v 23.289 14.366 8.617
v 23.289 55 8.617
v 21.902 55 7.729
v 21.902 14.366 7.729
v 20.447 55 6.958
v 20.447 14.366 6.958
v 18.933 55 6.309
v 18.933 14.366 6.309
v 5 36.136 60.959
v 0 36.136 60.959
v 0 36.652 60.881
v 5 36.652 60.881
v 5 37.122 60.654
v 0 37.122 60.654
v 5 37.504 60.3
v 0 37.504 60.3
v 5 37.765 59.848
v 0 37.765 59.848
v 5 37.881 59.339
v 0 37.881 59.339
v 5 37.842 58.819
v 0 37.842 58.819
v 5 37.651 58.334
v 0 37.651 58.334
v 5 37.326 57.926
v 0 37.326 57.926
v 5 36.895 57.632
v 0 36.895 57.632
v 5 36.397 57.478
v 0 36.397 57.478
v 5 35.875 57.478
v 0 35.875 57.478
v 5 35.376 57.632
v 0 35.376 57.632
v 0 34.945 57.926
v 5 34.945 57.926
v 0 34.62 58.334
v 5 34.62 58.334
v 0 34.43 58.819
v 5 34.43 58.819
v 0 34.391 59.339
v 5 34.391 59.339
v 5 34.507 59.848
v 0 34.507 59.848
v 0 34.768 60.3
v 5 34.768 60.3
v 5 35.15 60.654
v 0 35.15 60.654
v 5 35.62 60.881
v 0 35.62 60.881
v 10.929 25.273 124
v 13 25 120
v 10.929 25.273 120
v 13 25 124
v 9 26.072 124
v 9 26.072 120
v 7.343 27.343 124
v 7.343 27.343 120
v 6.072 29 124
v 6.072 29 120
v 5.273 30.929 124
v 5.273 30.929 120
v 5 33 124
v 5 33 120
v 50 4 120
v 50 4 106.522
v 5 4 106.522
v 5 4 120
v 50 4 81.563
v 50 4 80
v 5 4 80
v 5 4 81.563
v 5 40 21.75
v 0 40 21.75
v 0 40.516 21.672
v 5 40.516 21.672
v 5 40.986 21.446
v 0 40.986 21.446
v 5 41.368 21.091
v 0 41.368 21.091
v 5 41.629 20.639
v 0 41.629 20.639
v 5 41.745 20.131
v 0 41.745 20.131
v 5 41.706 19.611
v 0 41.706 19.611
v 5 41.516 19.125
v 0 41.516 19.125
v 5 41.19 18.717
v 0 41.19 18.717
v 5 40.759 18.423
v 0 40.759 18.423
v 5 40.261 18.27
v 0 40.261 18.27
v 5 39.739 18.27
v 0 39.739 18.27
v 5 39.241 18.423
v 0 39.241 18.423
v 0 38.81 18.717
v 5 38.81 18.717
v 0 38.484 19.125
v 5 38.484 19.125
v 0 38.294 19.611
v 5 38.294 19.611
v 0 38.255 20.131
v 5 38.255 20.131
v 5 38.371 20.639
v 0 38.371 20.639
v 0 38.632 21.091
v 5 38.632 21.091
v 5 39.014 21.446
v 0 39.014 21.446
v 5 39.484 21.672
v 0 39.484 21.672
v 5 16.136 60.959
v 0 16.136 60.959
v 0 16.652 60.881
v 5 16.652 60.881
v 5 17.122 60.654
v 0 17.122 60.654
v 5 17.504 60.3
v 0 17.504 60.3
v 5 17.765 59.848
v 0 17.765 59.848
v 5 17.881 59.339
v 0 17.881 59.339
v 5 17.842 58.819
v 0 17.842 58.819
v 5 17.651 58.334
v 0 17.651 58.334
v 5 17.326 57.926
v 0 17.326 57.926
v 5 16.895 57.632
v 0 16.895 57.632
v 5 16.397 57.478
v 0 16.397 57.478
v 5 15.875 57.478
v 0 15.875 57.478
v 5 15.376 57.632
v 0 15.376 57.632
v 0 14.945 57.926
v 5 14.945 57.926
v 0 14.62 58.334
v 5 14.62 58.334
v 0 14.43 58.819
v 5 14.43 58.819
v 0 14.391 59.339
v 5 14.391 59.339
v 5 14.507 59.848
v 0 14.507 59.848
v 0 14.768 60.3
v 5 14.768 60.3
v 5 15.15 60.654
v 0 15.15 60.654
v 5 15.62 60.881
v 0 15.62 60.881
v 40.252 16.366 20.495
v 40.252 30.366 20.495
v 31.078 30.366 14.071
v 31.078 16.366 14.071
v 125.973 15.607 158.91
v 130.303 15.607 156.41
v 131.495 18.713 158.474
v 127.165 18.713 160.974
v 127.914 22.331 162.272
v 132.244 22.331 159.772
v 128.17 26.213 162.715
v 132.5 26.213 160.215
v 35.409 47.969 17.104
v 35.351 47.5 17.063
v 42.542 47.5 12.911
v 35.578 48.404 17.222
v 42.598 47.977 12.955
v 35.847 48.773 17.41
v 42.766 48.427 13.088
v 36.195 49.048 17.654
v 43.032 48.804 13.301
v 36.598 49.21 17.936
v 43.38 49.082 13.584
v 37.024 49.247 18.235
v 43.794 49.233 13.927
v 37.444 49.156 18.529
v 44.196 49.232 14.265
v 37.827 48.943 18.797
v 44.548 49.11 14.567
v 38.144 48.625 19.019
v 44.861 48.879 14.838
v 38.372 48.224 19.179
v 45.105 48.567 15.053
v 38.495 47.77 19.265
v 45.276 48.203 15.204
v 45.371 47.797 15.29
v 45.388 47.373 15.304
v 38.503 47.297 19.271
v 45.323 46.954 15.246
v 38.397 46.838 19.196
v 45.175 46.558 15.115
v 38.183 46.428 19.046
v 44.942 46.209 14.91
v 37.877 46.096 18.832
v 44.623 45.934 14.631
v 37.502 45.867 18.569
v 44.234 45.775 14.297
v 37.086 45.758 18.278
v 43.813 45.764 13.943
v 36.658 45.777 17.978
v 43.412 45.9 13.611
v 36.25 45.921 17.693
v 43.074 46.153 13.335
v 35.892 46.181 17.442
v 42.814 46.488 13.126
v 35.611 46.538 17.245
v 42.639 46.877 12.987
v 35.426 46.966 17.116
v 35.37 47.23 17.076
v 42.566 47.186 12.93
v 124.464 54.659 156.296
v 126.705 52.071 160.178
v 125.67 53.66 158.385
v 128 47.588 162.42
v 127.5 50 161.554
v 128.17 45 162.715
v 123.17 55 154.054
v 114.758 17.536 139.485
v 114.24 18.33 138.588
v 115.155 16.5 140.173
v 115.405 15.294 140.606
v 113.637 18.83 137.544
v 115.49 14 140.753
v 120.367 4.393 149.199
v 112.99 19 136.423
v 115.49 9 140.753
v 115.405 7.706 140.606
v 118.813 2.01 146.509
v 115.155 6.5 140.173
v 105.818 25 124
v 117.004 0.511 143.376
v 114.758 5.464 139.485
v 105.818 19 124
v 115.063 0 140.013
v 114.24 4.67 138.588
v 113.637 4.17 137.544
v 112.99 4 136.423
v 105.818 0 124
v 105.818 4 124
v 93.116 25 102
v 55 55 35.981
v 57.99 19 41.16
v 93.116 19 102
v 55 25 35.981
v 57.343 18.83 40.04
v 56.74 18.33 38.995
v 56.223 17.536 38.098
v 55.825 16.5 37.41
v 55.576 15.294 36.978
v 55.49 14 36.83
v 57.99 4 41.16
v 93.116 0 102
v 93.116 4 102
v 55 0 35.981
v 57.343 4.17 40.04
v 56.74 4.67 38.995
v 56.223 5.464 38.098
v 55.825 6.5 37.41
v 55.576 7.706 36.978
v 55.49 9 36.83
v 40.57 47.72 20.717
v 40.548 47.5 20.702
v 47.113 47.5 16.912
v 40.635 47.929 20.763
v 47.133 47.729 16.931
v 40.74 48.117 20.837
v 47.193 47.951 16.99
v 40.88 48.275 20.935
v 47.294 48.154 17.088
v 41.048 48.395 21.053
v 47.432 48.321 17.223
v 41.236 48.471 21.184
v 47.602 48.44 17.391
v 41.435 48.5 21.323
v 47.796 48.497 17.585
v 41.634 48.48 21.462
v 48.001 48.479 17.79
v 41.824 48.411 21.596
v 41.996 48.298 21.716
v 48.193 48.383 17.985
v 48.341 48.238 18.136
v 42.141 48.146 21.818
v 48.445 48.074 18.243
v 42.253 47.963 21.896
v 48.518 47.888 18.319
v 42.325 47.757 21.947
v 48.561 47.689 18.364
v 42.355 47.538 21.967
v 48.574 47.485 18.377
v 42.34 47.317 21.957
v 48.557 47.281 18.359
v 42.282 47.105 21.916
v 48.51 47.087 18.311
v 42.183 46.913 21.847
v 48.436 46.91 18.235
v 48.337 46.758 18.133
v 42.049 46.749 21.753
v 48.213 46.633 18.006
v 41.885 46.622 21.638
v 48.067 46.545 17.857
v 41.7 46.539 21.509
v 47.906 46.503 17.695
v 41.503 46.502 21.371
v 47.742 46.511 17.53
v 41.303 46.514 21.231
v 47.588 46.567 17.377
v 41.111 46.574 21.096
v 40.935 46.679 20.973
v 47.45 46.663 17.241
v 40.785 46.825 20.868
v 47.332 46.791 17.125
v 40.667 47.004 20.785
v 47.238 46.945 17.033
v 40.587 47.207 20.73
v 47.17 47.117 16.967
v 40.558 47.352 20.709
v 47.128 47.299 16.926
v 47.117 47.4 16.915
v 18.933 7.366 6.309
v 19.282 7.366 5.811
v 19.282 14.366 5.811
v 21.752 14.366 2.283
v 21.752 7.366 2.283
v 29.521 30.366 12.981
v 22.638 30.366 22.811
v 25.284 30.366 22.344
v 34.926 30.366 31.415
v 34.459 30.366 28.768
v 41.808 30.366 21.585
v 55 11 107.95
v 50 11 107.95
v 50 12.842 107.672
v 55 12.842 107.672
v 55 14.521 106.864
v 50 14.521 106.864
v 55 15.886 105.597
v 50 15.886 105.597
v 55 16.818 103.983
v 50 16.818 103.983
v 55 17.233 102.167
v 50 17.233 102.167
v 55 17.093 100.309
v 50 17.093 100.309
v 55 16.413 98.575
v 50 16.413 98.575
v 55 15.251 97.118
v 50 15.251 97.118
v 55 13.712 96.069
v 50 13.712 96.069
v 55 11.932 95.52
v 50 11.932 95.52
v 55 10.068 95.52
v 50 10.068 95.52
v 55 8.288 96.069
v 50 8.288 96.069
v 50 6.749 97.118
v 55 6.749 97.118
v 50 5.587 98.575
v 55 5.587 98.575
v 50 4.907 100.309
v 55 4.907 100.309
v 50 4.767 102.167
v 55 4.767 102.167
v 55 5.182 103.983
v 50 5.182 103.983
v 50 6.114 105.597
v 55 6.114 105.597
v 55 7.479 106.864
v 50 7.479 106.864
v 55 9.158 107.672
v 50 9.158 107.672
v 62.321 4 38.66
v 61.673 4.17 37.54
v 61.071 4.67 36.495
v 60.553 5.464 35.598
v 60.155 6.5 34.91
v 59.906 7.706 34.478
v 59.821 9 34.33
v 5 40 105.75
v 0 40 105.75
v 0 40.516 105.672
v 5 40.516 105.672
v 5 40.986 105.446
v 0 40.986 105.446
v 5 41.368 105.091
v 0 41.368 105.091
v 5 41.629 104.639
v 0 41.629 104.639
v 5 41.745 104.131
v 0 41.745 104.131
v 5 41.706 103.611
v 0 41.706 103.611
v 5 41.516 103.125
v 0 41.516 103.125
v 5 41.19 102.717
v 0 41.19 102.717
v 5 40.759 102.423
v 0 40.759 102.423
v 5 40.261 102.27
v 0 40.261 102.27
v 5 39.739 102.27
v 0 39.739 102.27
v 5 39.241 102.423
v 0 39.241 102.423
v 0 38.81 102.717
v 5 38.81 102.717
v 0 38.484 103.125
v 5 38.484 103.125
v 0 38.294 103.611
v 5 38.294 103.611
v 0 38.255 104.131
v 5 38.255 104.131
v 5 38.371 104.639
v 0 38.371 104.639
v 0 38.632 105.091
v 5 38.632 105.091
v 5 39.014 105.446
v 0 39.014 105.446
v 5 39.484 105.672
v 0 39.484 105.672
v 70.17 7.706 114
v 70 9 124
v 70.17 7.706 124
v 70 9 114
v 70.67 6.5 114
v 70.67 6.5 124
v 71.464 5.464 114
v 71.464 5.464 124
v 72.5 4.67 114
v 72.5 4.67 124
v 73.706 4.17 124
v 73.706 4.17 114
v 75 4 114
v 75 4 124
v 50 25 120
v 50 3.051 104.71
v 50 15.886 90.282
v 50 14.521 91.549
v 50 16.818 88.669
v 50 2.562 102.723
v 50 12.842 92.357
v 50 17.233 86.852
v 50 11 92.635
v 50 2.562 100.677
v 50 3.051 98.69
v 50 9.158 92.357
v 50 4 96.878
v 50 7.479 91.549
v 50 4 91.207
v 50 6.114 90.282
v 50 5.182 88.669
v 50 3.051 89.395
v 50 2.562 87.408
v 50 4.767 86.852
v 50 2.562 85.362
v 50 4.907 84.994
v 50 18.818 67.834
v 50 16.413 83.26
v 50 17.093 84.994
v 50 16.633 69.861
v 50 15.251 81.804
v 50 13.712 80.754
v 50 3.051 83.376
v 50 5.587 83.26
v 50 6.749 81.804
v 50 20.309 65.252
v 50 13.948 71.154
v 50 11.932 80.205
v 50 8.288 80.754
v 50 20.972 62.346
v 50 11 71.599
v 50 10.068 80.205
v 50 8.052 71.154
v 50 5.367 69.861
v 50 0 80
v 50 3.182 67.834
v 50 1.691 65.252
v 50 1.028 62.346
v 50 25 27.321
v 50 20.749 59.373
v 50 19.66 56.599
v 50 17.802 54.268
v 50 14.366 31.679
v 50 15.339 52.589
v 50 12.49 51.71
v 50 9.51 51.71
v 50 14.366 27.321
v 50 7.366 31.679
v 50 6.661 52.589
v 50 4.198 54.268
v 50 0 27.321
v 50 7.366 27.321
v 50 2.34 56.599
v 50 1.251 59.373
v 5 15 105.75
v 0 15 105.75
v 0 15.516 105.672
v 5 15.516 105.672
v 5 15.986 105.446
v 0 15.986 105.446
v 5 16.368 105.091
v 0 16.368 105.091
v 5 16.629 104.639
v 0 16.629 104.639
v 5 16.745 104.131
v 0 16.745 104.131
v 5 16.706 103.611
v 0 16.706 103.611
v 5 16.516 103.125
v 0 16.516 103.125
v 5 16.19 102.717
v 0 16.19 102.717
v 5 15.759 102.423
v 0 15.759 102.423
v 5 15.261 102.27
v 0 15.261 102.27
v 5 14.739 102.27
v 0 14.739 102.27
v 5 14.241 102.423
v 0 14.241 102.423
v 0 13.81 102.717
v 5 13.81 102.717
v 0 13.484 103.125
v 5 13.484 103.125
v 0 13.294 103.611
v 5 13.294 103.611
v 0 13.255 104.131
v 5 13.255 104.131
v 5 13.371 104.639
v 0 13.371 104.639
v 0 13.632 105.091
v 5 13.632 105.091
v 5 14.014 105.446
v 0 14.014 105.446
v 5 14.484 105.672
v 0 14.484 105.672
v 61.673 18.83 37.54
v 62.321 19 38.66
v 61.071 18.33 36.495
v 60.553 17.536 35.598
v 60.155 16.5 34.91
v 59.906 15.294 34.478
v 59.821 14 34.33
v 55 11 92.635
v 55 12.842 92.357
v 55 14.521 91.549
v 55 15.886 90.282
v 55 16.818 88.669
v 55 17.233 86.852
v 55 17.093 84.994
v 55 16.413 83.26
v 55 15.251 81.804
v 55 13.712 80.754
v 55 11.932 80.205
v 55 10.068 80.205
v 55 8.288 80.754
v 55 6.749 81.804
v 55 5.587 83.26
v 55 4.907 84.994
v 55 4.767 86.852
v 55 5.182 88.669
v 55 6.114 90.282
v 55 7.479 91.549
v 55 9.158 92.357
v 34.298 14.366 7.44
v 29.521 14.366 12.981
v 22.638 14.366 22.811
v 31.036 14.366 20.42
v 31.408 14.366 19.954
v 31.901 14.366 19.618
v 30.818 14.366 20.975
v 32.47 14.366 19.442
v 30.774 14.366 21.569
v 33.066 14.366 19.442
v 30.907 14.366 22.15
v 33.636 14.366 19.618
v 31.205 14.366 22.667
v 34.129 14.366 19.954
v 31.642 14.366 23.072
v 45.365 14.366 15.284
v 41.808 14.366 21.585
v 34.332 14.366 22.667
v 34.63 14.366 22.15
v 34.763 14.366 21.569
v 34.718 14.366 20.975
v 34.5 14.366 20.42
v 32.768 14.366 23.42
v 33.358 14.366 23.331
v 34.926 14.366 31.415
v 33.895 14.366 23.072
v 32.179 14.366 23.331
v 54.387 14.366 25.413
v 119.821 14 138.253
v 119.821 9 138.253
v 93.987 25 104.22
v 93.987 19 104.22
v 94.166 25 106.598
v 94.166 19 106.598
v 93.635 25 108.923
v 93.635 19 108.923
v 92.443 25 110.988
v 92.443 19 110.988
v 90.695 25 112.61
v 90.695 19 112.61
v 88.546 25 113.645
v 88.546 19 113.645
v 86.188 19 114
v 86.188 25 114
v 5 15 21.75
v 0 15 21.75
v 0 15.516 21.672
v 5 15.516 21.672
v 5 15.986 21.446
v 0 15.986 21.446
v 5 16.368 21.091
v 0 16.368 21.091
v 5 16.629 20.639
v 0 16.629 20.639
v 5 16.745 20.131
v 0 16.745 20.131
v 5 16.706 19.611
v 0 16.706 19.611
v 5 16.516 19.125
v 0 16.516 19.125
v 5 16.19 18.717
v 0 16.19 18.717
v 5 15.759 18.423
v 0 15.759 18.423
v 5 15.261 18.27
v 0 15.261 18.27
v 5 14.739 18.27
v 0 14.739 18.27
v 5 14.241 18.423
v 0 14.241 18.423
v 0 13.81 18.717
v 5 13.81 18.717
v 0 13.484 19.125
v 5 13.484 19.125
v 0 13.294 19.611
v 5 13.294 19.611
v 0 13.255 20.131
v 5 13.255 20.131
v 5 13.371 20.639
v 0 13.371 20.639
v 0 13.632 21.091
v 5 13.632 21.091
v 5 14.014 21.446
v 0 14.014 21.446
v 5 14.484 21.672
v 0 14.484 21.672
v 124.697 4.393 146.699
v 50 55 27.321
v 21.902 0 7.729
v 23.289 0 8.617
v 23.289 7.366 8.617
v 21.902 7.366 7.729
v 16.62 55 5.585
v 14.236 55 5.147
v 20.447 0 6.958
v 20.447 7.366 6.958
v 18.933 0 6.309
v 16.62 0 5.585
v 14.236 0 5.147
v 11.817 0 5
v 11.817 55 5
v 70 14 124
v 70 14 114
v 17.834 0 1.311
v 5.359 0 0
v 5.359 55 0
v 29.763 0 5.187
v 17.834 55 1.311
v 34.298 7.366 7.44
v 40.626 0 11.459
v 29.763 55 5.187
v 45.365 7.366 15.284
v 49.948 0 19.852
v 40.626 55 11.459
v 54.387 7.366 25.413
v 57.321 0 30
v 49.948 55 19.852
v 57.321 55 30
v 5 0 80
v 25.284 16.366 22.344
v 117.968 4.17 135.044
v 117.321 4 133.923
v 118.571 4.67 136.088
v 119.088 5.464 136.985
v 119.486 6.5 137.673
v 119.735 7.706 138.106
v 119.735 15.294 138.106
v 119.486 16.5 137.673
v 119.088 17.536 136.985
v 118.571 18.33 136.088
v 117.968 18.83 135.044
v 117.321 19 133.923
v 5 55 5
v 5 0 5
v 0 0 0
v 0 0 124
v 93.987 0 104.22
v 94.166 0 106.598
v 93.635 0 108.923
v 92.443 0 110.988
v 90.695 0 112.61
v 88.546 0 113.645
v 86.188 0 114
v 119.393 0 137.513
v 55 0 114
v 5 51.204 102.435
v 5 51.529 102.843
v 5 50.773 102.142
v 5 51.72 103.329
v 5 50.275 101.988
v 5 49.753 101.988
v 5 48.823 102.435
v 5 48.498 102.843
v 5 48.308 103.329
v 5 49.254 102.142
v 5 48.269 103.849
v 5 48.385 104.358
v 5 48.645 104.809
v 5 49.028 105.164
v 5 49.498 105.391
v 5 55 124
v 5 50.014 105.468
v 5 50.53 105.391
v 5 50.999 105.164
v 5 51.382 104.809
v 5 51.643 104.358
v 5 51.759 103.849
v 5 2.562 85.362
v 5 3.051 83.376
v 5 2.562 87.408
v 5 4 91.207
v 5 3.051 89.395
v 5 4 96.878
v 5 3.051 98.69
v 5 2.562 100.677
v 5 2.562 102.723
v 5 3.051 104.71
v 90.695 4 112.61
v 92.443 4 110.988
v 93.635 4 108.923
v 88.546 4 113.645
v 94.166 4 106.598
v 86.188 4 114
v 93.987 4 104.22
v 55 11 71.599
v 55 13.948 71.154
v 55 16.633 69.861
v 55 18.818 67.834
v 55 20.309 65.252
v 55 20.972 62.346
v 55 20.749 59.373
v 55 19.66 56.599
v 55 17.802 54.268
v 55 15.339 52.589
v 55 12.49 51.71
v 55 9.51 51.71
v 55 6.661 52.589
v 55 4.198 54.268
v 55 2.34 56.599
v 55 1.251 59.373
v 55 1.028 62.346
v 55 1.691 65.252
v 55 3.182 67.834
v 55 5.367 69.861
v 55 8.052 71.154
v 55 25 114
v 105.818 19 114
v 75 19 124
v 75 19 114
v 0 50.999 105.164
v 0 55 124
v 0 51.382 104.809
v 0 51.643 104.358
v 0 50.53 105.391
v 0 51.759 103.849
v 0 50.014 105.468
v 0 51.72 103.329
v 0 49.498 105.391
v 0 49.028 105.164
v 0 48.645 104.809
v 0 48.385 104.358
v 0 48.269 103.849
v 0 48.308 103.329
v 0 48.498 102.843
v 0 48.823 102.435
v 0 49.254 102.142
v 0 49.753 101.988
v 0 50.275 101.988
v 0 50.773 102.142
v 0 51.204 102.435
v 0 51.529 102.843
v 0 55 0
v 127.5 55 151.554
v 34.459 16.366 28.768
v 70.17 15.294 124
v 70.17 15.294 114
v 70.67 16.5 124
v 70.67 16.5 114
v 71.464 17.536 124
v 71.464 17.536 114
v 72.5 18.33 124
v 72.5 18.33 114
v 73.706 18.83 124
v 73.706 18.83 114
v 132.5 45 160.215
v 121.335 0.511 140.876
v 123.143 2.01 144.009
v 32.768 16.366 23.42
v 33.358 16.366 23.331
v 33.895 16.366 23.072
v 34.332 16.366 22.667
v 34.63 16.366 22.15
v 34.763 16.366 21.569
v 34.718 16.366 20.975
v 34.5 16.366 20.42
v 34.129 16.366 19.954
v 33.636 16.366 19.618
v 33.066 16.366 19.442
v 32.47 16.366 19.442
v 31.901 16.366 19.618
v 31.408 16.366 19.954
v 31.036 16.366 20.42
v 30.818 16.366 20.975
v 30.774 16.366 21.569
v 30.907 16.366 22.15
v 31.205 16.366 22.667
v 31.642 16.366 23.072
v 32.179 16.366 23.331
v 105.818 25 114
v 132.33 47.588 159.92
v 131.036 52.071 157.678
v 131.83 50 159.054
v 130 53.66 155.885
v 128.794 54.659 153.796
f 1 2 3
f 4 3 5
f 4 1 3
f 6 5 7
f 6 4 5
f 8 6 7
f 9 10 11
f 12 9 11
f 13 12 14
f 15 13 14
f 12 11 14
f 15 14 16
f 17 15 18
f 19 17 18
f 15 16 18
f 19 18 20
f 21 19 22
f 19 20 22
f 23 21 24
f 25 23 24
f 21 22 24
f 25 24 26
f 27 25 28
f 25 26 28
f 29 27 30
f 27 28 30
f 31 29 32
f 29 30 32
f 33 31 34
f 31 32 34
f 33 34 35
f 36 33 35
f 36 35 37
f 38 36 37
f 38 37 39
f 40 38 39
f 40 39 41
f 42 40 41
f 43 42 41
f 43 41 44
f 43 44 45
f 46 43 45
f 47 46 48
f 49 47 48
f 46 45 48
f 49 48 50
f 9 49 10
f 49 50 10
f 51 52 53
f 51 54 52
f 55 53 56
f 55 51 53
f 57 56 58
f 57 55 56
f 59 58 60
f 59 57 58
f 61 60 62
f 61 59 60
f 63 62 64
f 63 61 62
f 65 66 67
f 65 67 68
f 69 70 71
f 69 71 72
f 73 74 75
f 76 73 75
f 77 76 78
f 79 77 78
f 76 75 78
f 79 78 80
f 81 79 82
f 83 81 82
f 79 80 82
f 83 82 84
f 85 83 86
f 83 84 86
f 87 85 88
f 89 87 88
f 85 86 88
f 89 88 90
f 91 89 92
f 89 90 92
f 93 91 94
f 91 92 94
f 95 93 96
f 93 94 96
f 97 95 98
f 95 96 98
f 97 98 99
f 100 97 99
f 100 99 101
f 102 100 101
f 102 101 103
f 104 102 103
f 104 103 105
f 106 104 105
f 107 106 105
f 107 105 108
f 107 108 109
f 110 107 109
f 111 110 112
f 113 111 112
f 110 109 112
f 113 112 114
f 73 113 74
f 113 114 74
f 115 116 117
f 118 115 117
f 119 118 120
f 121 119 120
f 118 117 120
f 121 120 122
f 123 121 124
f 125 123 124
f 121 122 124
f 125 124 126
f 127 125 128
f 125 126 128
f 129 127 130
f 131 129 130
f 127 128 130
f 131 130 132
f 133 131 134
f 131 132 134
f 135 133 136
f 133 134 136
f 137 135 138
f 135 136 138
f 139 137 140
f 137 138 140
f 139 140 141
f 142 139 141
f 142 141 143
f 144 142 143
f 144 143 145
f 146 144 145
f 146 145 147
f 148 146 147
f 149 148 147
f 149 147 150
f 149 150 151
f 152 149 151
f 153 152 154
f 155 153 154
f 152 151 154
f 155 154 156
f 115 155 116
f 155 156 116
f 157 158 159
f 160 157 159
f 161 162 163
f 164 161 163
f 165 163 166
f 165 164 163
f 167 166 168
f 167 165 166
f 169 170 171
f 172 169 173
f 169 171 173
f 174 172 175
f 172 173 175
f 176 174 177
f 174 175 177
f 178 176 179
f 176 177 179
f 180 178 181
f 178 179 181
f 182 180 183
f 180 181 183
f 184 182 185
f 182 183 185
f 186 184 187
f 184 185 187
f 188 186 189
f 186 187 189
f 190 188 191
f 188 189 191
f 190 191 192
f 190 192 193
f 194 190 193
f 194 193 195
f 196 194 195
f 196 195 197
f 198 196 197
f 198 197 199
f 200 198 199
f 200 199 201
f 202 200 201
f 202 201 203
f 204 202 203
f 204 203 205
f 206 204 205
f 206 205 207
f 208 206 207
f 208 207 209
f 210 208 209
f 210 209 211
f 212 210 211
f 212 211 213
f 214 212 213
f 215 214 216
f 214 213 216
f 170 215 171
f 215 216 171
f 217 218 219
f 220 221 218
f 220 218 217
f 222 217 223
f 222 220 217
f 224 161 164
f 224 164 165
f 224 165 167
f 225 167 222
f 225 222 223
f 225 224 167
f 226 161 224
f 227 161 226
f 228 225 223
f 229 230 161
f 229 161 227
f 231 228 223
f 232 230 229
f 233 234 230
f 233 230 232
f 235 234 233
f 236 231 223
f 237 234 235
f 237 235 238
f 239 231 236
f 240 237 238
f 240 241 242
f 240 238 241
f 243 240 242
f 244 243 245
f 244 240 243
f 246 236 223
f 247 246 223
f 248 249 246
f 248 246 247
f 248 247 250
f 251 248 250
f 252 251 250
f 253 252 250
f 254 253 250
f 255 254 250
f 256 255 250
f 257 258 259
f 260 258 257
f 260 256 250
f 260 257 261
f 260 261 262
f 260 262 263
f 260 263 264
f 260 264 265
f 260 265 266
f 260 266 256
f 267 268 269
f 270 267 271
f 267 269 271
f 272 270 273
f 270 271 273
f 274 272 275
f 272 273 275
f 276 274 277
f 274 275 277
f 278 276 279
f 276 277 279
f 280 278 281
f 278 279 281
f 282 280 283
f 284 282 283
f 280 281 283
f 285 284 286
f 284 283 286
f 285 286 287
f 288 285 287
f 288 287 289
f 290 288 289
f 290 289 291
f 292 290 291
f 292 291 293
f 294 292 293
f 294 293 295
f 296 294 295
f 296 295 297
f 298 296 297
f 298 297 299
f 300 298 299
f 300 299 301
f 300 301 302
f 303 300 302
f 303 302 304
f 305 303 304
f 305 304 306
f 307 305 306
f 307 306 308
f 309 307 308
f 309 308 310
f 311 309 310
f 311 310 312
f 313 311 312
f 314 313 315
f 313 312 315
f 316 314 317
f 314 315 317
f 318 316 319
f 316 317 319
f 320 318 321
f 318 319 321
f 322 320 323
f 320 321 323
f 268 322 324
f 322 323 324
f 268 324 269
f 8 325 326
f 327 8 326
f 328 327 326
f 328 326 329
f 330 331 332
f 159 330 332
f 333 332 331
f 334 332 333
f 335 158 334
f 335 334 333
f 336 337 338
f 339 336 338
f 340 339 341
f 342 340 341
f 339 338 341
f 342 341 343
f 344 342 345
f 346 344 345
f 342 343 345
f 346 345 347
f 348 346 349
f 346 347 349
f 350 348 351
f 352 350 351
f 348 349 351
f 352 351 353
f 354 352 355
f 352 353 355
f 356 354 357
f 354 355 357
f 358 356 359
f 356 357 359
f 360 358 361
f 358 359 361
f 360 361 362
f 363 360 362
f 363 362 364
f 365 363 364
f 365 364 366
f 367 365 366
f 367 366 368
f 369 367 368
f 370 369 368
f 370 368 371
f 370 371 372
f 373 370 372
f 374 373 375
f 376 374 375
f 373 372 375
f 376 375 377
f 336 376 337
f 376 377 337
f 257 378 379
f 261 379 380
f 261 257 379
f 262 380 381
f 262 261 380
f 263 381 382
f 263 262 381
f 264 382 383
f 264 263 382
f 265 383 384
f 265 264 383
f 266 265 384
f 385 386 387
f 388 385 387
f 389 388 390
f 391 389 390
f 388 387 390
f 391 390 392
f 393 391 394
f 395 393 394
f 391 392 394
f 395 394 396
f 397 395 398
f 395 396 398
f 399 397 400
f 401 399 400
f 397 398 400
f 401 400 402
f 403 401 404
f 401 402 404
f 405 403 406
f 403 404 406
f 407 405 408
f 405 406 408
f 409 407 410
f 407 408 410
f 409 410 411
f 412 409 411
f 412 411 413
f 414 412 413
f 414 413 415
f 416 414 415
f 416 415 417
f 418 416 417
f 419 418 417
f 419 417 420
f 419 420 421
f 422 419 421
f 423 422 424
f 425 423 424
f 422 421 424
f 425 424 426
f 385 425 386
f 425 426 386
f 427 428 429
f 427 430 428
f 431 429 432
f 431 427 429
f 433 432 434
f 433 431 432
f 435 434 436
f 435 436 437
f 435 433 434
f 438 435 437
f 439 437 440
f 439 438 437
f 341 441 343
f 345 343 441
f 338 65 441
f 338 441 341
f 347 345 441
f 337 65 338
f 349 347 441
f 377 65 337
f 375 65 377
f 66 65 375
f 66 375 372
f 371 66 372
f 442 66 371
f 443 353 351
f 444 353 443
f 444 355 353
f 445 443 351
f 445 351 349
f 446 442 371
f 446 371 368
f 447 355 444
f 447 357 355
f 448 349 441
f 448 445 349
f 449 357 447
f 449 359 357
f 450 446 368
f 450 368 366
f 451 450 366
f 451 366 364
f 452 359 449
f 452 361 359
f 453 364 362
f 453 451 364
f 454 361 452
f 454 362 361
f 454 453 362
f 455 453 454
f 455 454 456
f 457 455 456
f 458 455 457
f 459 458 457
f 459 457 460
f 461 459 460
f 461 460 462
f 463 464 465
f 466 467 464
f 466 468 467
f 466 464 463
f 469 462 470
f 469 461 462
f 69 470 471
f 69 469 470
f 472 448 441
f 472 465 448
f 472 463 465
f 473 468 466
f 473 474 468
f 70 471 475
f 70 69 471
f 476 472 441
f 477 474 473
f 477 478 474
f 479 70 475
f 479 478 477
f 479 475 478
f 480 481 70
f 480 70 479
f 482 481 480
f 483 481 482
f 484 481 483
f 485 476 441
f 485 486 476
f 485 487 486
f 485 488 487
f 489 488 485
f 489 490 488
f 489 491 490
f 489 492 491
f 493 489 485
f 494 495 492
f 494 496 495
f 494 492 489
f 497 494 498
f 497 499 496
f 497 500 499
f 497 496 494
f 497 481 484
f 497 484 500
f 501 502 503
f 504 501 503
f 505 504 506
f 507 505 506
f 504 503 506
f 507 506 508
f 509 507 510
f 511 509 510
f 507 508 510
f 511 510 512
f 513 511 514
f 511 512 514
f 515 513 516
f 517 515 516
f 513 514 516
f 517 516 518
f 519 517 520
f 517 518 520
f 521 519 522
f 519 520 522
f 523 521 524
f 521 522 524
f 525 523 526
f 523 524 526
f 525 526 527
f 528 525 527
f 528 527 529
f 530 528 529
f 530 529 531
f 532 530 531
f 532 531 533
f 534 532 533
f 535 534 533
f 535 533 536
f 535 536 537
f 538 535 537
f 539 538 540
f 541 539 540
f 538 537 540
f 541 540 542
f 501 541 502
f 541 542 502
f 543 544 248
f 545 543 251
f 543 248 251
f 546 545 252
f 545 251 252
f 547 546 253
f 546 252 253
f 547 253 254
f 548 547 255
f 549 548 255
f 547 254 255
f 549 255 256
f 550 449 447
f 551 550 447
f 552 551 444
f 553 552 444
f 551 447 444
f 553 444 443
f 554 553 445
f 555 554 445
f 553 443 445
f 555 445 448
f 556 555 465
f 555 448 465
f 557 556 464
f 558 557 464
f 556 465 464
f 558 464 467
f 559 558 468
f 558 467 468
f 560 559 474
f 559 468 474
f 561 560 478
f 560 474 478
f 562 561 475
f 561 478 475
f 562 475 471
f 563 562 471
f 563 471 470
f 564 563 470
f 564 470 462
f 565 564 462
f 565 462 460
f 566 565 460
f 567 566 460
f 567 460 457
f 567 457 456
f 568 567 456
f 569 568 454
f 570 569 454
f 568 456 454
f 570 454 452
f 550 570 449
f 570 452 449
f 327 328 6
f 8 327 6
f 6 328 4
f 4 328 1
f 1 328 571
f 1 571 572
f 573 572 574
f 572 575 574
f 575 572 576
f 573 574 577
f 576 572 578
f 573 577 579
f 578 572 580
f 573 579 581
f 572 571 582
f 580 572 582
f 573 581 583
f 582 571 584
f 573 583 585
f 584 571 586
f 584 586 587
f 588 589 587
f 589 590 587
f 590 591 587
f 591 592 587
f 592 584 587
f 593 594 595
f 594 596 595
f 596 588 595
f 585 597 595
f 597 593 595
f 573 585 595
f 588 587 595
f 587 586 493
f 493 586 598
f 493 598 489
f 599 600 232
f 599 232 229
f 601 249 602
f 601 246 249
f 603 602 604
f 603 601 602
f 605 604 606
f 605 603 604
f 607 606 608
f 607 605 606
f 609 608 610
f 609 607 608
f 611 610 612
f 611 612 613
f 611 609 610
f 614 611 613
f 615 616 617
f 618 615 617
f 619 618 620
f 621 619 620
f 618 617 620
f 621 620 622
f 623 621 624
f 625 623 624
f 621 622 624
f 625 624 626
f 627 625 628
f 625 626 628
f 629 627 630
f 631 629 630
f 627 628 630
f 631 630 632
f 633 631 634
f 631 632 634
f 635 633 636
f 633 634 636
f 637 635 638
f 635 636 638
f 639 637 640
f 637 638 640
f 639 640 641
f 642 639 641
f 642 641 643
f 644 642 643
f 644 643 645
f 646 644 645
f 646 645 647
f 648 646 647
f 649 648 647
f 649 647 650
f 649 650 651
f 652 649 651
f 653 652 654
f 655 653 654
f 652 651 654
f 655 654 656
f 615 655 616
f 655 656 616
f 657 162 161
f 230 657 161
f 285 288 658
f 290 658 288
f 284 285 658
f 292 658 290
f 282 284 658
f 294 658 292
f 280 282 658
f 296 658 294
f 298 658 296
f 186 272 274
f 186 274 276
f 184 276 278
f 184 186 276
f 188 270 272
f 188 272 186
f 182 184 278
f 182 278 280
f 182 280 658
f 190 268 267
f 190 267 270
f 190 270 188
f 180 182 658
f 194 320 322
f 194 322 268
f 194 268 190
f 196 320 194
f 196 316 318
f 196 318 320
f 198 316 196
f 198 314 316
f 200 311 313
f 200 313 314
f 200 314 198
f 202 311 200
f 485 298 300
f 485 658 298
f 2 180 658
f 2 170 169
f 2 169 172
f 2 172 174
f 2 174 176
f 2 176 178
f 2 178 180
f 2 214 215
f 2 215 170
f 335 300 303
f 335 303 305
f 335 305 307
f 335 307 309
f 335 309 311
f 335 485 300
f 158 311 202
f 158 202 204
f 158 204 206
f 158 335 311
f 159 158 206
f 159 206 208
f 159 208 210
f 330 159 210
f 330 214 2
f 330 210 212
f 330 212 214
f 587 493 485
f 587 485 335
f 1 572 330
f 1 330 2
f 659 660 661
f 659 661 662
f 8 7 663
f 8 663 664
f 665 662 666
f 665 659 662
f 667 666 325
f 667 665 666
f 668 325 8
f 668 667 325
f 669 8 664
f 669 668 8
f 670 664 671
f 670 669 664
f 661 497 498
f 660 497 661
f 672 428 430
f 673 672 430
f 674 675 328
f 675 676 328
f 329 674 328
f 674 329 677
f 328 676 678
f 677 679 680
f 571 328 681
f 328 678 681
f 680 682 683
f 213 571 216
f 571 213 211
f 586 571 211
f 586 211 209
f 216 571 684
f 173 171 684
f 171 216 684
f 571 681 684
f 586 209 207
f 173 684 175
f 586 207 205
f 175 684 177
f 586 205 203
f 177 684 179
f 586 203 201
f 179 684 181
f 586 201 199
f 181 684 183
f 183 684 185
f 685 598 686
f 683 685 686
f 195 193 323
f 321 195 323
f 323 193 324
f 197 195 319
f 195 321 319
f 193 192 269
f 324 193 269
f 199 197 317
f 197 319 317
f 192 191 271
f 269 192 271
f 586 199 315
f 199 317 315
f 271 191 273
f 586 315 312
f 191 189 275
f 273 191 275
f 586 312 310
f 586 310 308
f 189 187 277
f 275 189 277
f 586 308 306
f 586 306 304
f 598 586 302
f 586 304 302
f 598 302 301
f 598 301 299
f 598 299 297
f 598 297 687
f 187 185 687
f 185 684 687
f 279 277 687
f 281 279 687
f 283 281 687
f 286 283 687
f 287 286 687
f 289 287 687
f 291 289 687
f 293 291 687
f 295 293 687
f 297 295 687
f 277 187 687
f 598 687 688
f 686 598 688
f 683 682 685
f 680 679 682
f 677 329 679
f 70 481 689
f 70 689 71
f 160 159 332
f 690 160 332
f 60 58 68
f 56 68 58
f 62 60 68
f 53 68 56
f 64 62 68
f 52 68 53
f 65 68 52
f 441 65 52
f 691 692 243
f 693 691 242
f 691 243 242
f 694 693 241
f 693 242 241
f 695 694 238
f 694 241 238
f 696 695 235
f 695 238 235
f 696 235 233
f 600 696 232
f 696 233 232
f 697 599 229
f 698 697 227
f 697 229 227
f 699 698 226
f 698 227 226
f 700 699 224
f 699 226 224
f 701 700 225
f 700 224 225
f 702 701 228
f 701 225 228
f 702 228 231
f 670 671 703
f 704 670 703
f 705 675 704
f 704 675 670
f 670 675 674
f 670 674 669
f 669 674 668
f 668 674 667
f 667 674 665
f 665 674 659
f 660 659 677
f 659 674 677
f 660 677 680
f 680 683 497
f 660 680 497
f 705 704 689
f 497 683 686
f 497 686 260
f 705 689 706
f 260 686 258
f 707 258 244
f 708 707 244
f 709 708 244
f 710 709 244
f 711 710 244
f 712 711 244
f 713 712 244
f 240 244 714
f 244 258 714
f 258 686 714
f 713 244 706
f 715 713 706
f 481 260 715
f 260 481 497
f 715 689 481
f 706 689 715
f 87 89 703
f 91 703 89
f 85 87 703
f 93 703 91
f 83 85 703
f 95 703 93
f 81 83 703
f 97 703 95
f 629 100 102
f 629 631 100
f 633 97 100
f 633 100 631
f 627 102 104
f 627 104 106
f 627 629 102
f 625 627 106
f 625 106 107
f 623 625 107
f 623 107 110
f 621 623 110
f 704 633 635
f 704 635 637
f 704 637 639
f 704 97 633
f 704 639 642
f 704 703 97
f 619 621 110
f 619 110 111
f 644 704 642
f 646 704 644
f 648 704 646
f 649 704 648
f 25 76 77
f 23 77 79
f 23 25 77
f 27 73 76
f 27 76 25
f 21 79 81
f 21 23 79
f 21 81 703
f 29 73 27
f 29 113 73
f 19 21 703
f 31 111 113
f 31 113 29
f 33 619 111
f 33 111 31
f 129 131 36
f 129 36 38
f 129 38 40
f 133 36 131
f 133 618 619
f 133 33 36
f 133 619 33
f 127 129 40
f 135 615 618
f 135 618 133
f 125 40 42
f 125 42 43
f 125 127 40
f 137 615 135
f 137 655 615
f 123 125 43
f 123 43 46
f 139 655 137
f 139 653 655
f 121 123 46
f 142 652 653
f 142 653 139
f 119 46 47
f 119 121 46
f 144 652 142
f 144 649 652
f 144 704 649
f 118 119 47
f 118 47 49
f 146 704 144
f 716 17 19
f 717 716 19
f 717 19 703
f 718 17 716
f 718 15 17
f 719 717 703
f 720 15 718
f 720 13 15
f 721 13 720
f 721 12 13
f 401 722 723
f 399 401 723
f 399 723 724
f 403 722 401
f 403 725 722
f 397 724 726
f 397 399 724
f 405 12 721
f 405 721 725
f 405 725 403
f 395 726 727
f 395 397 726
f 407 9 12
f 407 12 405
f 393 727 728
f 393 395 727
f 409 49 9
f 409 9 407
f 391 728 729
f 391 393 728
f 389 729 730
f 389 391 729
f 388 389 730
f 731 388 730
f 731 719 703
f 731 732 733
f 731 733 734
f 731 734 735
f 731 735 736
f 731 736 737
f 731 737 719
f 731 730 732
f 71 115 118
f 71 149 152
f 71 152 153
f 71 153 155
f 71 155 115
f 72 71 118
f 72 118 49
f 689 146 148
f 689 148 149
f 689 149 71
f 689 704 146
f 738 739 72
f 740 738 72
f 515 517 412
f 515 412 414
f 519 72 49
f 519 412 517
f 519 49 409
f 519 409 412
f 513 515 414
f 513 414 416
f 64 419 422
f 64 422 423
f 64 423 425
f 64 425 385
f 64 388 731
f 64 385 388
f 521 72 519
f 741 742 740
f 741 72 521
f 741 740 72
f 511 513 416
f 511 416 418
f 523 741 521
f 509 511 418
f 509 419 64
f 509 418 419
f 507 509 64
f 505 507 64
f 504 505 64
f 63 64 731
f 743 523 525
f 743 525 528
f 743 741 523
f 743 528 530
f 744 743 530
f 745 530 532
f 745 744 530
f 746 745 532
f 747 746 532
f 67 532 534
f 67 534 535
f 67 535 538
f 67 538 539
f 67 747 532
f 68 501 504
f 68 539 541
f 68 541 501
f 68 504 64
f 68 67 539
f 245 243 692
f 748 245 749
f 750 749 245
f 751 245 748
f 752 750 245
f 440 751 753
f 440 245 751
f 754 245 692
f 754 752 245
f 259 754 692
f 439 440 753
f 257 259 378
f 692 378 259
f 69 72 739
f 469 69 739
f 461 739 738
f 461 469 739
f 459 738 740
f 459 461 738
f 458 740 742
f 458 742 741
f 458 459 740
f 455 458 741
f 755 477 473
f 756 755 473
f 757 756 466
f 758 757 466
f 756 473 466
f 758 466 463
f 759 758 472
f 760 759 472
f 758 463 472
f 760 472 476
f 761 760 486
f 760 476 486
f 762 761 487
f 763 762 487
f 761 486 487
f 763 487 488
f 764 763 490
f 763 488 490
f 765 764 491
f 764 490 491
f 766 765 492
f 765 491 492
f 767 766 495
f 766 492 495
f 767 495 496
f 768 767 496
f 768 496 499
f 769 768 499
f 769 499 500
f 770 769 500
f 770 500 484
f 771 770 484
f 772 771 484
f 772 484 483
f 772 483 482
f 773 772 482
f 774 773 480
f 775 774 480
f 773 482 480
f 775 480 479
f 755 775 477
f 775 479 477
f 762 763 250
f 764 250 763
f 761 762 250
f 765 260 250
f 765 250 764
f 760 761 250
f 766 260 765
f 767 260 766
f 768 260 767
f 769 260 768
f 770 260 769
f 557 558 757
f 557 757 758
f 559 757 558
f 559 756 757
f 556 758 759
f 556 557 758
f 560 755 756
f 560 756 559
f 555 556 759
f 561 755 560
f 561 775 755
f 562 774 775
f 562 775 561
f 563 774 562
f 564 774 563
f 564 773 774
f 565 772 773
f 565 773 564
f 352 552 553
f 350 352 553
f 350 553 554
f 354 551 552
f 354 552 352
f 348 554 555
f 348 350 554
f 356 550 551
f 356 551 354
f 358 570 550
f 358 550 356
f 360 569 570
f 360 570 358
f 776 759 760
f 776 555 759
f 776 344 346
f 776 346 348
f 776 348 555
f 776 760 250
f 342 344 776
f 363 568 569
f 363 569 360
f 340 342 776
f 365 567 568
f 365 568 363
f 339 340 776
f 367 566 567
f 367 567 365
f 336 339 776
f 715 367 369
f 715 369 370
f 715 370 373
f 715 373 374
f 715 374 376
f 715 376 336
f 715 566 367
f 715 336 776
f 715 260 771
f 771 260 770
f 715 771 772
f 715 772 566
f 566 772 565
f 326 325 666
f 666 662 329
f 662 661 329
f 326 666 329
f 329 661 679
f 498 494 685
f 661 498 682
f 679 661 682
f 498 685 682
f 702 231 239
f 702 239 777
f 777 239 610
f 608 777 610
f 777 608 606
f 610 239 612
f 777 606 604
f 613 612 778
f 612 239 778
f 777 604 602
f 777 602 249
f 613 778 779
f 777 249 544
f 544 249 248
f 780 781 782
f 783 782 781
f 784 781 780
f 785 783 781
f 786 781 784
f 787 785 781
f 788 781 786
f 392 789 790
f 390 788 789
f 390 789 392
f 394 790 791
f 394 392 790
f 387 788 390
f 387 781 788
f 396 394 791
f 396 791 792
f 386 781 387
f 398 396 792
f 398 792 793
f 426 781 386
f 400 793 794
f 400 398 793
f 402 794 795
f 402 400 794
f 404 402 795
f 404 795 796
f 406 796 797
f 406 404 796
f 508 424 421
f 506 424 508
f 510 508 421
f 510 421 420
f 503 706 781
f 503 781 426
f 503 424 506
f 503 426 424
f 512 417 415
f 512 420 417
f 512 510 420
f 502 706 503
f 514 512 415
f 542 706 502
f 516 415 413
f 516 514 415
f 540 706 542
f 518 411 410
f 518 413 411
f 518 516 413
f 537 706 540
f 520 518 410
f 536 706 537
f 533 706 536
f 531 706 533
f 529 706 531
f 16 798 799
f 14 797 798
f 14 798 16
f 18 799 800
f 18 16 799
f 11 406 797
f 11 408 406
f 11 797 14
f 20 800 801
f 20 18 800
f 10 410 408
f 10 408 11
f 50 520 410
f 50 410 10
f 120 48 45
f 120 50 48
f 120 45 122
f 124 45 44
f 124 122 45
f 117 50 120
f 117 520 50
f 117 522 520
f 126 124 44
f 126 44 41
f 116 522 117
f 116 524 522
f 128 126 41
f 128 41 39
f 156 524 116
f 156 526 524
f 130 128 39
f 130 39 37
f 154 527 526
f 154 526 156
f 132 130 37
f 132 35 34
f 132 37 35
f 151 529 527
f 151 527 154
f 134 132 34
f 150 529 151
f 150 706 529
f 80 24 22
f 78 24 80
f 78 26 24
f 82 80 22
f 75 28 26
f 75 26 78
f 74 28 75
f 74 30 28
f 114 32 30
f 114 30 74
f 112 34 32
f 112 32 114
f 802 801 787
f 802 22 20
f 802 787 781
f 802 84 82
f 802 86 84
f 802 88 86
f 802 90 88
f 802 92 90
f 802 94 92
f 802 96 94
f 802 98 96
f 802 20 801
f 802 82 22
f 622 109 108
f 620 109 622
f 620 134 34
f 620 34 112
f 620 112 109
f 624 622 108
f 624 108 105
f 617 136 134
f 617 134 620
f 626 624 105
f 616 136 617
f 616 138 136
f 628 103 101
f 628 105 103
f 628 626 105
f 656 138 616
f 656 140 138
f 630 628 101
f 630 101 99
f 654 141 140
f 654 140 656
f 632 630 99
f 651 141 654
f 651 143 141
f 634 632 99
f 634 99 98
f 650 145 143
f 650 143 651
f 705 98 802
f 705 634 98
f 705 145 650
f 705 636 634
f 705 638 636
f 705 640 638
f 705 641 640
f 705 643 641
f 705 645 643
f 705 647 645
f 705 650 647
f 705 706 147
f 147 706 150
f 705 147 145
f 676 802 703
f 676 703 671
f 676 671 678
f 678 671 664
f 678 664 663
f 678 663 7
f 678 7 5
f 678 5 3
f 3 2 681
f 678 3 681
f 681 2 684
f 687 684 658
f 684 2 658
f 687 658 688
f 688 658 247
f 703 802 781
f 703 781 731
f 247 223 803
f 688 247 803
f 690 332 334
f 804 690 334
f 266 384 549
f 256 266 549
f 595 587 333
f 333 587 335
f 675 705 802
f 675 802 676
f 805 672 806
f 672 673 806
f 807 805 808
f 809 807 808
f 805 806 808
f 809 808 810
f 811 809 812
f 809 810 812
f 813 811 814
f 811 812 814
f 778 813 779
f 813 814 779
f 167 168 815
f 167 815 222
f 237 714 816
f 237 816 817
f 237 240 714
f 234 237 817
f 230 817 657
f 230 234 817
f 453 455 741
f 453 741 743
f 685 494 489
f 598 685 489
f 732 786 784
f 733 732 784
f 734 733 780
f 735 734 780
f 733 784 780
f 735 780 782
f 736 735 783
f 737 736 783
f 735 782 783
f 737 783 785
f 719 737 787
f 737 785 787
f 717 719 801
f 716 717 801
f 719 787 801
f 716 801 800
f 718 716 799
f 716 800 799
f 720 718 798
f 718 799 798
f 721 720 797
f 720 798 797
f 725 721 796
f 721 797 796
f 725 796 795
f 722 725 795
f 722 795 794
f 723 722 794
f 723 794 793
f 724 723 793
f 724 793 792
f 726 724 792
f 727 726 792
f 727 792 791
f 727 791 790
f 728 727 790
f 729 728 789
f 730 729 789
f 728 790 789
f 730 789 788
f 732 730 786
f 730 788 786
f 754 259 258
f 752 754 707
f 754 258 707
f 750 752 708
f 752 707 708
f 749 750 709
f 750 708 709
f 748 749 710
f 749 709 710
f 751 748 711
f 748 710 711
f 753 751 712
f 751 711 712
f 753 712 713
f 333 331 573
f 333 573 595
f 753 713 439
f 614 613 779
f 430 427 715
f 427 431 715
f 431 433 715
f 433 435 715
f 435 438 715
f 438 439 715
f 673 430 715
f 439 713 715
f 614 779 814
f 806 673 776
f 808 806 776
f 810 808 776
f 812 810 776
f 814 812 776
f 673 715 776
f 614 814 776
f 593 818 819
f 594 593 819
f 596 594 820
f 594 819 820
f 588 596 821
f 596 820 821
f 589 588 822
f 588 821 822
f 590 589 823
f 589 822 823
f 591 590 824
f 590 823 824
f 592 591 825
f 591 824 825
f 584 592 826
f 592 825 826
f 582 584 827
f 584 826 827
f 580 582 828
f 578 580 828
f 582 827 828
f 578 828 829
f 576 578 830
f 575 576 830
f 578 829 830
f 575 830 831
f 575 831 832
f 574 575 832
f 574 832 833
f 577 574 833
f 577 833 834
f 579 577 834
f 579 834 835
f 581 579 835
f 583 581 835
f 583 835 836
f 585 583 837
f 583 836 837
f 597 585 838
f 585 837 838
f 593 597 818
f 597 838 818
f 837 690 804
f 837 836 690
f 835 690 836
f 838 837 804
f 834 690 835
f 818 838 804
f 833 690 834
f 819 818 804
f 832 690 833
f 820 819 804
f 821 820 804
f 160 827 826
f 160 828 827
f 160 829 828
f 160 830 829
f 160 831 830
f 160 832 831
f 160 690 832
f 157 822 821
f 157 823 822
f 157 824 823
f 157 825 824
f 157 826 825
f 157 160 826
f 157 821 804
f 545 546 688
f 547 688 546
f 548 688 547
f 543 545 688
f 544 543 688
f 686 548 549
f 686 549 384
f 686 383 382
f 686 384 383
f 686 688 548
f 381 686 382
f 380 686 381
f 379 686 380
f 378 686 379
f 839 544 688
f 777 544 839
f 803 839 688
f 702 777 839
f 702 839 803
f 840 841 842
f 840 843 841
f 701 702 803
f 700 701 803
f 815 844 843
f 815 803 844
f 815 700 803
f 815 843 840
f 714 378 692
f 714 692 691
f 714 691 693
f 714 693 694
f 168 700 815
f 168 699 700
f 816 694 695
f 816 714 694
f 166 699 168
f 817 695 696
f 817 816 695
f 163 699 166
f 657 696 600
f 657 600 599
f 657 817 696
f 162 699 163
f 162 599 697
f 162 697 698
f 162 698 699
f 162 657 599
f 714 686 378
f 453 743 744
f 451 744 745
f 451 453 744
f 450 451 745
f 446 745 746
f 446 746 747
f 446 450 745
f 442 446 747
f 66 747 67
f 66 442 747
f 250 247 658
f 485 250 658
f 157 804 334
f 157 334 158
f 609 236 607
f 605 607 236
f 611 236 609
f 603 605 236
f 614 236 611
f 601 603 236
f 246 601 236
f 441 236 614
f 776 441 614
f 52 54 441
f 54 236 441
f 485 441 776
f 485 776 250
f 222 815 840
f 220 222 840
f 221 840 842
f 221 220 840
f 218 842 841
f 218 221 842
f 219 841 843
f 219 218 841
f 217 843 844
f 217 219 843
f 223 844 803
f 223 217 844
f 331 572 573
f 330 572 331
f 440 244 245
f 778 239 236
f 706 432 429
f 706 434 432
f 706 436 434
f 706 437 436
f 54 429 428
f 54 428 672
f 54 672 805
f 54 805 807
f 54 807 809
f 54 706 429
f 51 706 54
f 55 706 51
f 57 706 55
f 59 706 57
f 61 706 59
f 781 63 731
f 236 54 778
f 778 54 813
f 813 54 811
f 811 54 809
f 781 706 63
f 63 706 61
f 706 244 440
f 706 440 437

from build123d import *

# Parameters (mm, degrees)
BOSS_EXTRUDE3_DEPTH     = 55
FILLET1_R               = 60
SKETCH4_W               = 15
SKETCH4_H               = 16
BOSS_EXTRUDE4_DEPTH     = 12
CUT_EXTRUDE1_DEPTH      = 20
CUT_EXTRUDE1_DEPTH_BACK = 14
SKETCH5_W               = 40
SKETCH5_H               = 7
CUT_EXTRUDE2_DEPTH      = 14
SKETCH7_R               = 2
CUT_EXTRUDE3_DEPTH      = 2
CUT_EXTRUDE4_DEPTH      = 30
SKETCH9_R               = 10
SKETCH9_R_2             = 6.25
CUT_EXTRUDE5_DEPTH      = 5
SKETCH10_W              = 120
SKETCH10_H              = 15
CUT_EXTRUDE6_DEPTH      = 5
SKETCH11_W              = 4
SKETCH11_H              = 25
BOSS_EXTRUDE5_DEPTH     = 45
FILLET3_R               = 20
BOSS_EXTRUDE6_REACH     = 190.434
SKETCH12_W              = 10
SKETCH12_H              = 4
SKETCH13_W              = 40
SKETCH13_H              = 4
BOSS_EXTRUDE7_DEPTH     = 45
FILLET4_R               = 5
CUT_EXTRUDE7_DEPTH      = 45
SKETCH16_R              = 1.75
CUT_EXTRUDE8_DEPTH      = 5
SKETCH15_R              = 1.75
CUT_EXTRUDE9_DEPTH      = 5
CUT_EXTRUDE10_REACH     = 216.345
SKETCH17_R              = 1.75
SKETCH17_R_2            = 1
CHAMFER1_SIZE           = 20
FILLET6_R               = 15
FILLET7_R               = 10
SKETCH18_W              = 15
SKETCH18_H              = 10
BOSS_EXTRUDE8_DEPTH     = 21
SKETCH19_W              = 10
SKETCH19_H              = 6
BOSS_EXTRUDE9_DEPTH     = 35.817931
FILLET9_R               = 5
FILLET10_R              = 8
FILLET11_R              = 8


with BuildPart() as part:
    # Sketch3 → Boss-Extrude3 (new body)
    with BuildSketch(Plane(origin=(0, 0, 0), x_dir=(1, 0, 0), z_dir=(0, 1, 0))):
        Polygon((128.169872981, -162.7146997), (55, -35.980762114), (55, -124), (50, -124), (50, -27.320508076), (18.123010882, -5), (5, -5), (5, -124), (0, -124), (0, 0), (40, 0), (132.5, -160.2146997), align=None)
    extrude(amount=BOSS_EXTRUDE3_DEPTH)

    # Fillet1
    fillet1_edges = [part.edges().sort_by_distance(p)[0] for p in [
        (40, 27.5, 0),
    ]]
    fillet(fillet1_edges, radius=FILLET1_R)

    # Sketch4 → Boss-Extrude4 (add)
    with BuildSketch(Plane(origin=(3.613056499, 0, -5.159979438), x_dir=(0.8191520442889911, 0, 0.5735764363510469), z_dir=(-0.5735764363510469, 0, 0.8191520442889911))):
        with Locations((39.128001876, 22.366188336)):
            Rectangle(SKETCH4_W, SKETCH4_H)
    extrude(amount=BOSS_EXTRUDE4_DEPTH)

    # Sketch5 → Cut-Extrude1 (cut, two sides: drawn at the far end of the back side and taken through both)
    with BuildSketch(Plane(origin=(3.613056499, 0, -5.159979438), x_dir=(0.8191520442889911, 0, 0.5735764363510469), z_dir=(-0.5735764363510469, 0, 0.8191520442889911)).offset(-CUT_EXTRUDE1_DEPTH_BACK)):
        with Locations((39.128001876, 10.866188336)):
            Rectangle(SKETCH5_W, SKETCH5_H)
    extrude(amount=CUT_EXTRUDE1_DEPTH + CUT_EXTRUDE1_DEPTH_BACK, mode=Mode.SUBTRACT)

    # Sketch6 → Cut-Extrude2 (cut)
    with BuildSketch(Plane(origin=(0, 30.366188336, 0), x_dir=(1, 0, 0), z_dir=(0, 1, 0))):
        Polygon((31.077587777, -14.070892396), (25.28446577, -22.344328043), (34.458968666, -28.76838413), (40.252090673, -20.494948483), align=None)
    extrude(amount=-CUT_EXTRUDE2_DEPTH, mode=Mode.SUBTRACT)

    # Sketch7 → Cut-Extrude3 (cut)
    with BuildSketch(Plane(origin=(0, 16.366188336, 0), x_dir=(1, 0, 0), z_dir=(0, 1, 0))):
        with Locations(Location((32.768278221, -21.419638263, 0), (0, 0, 270))):
            Circle(SKETCH7_R)
    extrude(amount=-CUT_EXTRUDE3_DEPTH, mode=Mode.SUBTRACT)

    # Sketch8 → Cut-Extrude4 (cut)
    with BuildSketch(Plane(origin=(0, 55, 0), x_dir=(1, 0, 0), z_dir=(0, 1, 0))):
        Polygon((55, -35.980762114), (50, -27.320508076), (50, -124), (55, -124), align=None)
    extrude(amount=-CUT_EXTRUDE4_DEPTH, mode=Mode.SUBTRACT)

    # Sketch9 → Cut-Extrude5 (cut)
    with BuildSketch(Plane.ZY.offset(-50)):
        with Locations((61.598678321, 11)):
            Circle(SKETCH9_R)
        with Locations((86.385123427, 11)):
            Circle(SKETCH9_R_2)
        with Locations((101.700022006, 11)):
            Circle(SKETCH9_R_2)
    extrude(amount=-CUT_EXTRUDE5_DEPTH, mode=Mode.SUBTRACT)

    # Sketch10 → Cut-Extrude6 (cut)
    with BuildSketch(Plane(origin=(30, 0, -17.320508076), x_dir=(-0.5000000000000047, 0, -0.866025403784436), z_dir=(0.866025403784436, 0, -0.5000000000000047))):
        with Locations((-119.641016151, 11.5)):
            Rectangle(SKETCH10_W, SKETCH10_H)
    extrude(amount=-CUT_EXTRUDE6_DEPTH, mode=Mode.SUBTRACT)

    # Sketch11 → Boss-Extrude5 (add)
    with BuildSketch(Plane.ZY.offset(-50)):
        with Locations((122, 12.5)):
            Rectangle(SKETCH11_W, SKETCH11_H)
    extrude(amount=BOSS_EXTRUDE5_DEPTH)

    # Fillet3
    # the kernel refuses this fillet: 20 mm, written as the material it adds along each edge
    with BuildSketch(Plane(origin=(18.123010882, 0, 5), x_dir=(-1, 0, 0), z_dir=(0, 1, 0))) as fillet3_piece_1_section:
        with BuildLine():
            CenterArc((FILLET3_R * 0.315298788879, FILLET3_R), FILLET3_R, 235, 35)
            Line((-FILLET3_R * 0.258277647472, FILLET3_R * 0.180847955711), (0, 0))
            Line((0, 0), (FILLET3_R * 0.315298788879, 0))
        make_face()
    fillet3_piece_1 = extrude(amount=55, mode=Mode.PRIVATE)
    fillet3_piece_1 = split(fillet3_piece_1, bisect_by=Plane(origin=(18.647698148, 3.683094168, 6.716980636), z_dir=(-0.8191520442889912, 0, -0.5735764363510469)), keep=Keep.TOP, mode=Mode.PRIVATE)
    fillet3_piece_1 = split(fillet3_piece_1, bisect_by=Plane(origin=(16.403340896, 7.366188336, 5.14546477), z_dir=(0, -1, 0)), keep=Keep.TOP, mode=Mode.PRIVATE)
    add(fillet3_piece_1)
    with BuildSketch(Plane(origin=(18.123010882, 0, 5), x_dir=(-1, 0, 0), z_dir=(0, 1, 0))) as fillet3_piece_2_section:
        with BuildLine():
            CenterArc((FILLET3_R * 0.315298788879, FILLET3_R), FILLET3_R, 235, 35)
            Line((-FILLET3_R * 0.258277647472, FILLET3_R * 0.180847955711), (0, 0))
            Line((0, 0), (FILLET3_R * 0.315298788879, 0))
        make_face()
    fillet3_piece_2 = extrude(amount=55, mode=Mode.PRIVATE)
    fillet3_piece_2 = split(fillet3_piece_2, bisect_by=Plane(origin=(19.32323837, 3.683094168, 5.752209215), z_dir=(0.8191520442889912, 0, 0.5735764363510469)), keep=Keep.TOP, mode=Mode.PRIVATE)
    fillet3_piece_2 = split(fillet3_piece_2, bisect_by=Plane(origin=(20.990357579, 7.366188336, 6.919538653), z_dir=(0, -1, 0)), keep=Keep.TOP, mode=Mode.PRIVATE)
    add(fillet3_piece_2)
    with BuildSketch(Plane(origin=(18.123010882, 0, 5), x_dir=(-1, 0, 0), z_dir=(0, 1, 0))) as fillet3_piece_3_section:
        with BuildLine():
            CenterArc((FILLET3_R * 0.315298788879, FILLET3_R), FILLET3_R, 235, 35)
            Line((-FILLET3_R * 0.258277647472, FILLET3_R * 0.180847955711), (0, 0))
            Line((0, 0), (FILLET3_R * 0.315298788879, 0))
        make_face()
    fillet3_piece_3 = extrude(amount=55, mode=Mode.PRIVATE)
    fillet3_piece_3 = split(fillet3_piece_3, bisect_by=Plane(origin=(16.403340896, 14.366188336, 5.14546477), z_dir=(0, -1, 0)), keep=Keep.TOP, mode=Mode.PRIVATE)
    fillet3_piece_3 = split(fillet3_piece_3, bisect_by=Plane(origin=(18.647698148, 10.866188336, 6.716980636), z_dir=(-0.8191520442889912, 0, -0.5735764363510469)), keep=Keep.TOP, mode=Mode.PRIVATE)
    fillet3_piece_3 = split(fillet3_piece_3, bisect_by=Plane(origin=(16.403340896, 7.366188336, 5.14546477), z_dir=(0, 1, 0)), keep=Keep.TOP, mode=Mode.PRIVATE)
    add(fillet3_piece_3)
    with BuildSketch(Plane(origin=(18.123010882, 0, 5), x_dir=(-1, 0, 0), z_dir=(0, 1, 0))) as fillet3_piece_4_section:
        with BuildLine():
            CenterArc((FILLET3_R * 0.315298788879, FILLET3_R), FILLET3_R, 235, 35)
            Line((-FILLET3_R * 0.258277647472, FILLET3_R * 0.180847955711), (0, 0))
            Line((0, 0), (FILLET3_R * 0.315298788879, 0))
        make_face()
    fillet3_piece_4 = extrude(amount=55, mode=Mode.PRIVATE)
    fillet3_piece_4 = split(fillet3_piece_4, bisect_by=Plane(origin=(16.403340896, 14.366188336, 5.14546477), z_dir=(0, 1, 0)), keep=Keep.TOP, mode=Mode.PRIVATE)
    fillet3_piece_4 = split(fillet3_piece_4, bisect_by=Plane(origin=(18.647698148, 34.683094168, 6.716980636), z_dir=(-0.8191520442889912, 0, -0.5735764363510469)), keep=Keep.TOP, mode=Mode.PRIVATE)
    add(fillet3_piece_4)
    with BuildSketch(Plane(origin=(18.123010882, 0, 5), x_dir=(-1, 0, 0), z_dir=(0, 1, 0))) as fillet3_piece_5_section:
        with BuildLine():
            CenterArc((FILLET3_R * 0.315298788879, FILLET3_R), FILLET3_R, 235, 35)
            Line((-FILLET3_R * 0.258277647472, FILLET3_R * 0.180847955711), (0, 0))
            Line((0, 0), (FILLET3_R * 0.315298788879, 0))
        make_face()
    fillet3_piece_5 = extrude(amount=55, mode=Mode.PRIVATE)
    fillet3_piece_5 = split(fillet3_piece_5, bisect_by=Plane(origin=(20.990357579, 14.366188336, 6.919538653), z_dir=(0, 1, 0)), keep=Keep.TOP, mode=Mode.PRIVATE)
    fillet3_piece_5 = split(fillet3_piece_5, bisect_by=Plane(origin=(19.32323837, 34.683094168, 5.752209215), z_dir=(0.8191520442889912, 0, 0.5735764363510469)), keep=Keep.TOP, mode=Mode.PRIVATE)
    add(fillet3_piece_5)

    # Boss-Extrude6: up to this plane
    boss_extrude6_end = Plane(origin=(128.169872981, 55, 162.7146997), z_dir=(-0.8660254037844362, 0, 0.5000000000000044))
    # Sketch12 → Boss-Extrude6 (add, up to the surface)
    with BuildSketch(Plane(origin=(55, 0, 0), x_dir=(0, 0, -1), z_dir=(1, 0, 0)), mode=Mode.PRIVATE) as boss_extrude6_sk1:
        with Locations((-119, 2)):
            Rectangle(SKETCH12_W, SKETCH12_H)
    boss_extrude6_tool1 = split(extrude(boss_extrude6_sk1.sketch, amount=BOSS_EXTRUDE6_REACH, mode=Mode.PRIVATE), bisect_by=boss_extrude6_end, keep=Keep.BOTH, mode=Mode.PRIVATE)
    add(boss_extrude6_tool1.solids().sort_by_distance((55, 2, 119))[0])

    # Sketch13 → Boss-Extrude7 (add)
    with BuildSketch(Plane.ZY.offset(-50)):
        with Locations((100, 2)):
            Rectangle(SKETCH13_W, SKETCH13_H)
    extrude(amount=BOSS_EXTRUDE7_DEPTH)

    # Fillet4
    fillet4_edges = [part.edges().sort_by_distance(p)[0] for p in [
        (57.655444566, 4, 35.580127019),
        (57.655444566, 19, 35.580127019),
        (117.655444566, 19, 139.503175473),
        (117.655444566, 4, 139.503175473),
    ]]
    fillet(fillet4_edges, radius=FILLET4_R)

    # Sketch14 → Cut-Extrude7 (cut)
    with BuildSketch(Plane.ZY.offset(-50)):
        with BuildLine():
            ThreePointArc((94.042572717, 14.689643665), (77.885123427, 11), (94.042572717, 7.310356335))
            ThreePointArc((94.042572717, 7.310356335), (110.200022006, 11), (94.042572717, 14.689643665))
        make_face()
    extrude(amount=CUT_EXTRUDE7_DEPTH, mode=Mode.SUBTRACT)

    # Sketch16 → Cut-Extrude8 (cut)
    with BuildSketch(Plane.ZY):
        with Locations((59.208509529, 36.135781847)):
            Circle(SKETCH16_R)
        with Locations((59.208509529, 16.135781847)):
            Circle(SKETCH16_R)
        with Locations((103.718271361, 50.013687011)):
            Circle(SKETCH16_R)
    extrude(amount=-CUT_EXTRUDE8_DEPTH, mode=Mode.SUBTRACT)

    # Sketch15 → Cut-Extrude9 (cut)
    with BuildSketch(Plane.ZY):
        with Locations((104, 40)):
            Circle(SKETCH15_R)
        with Locations((104, 15)):
            Circle(SKETCH15_R)
        with Locations((20, 15)):
            Circle(SKETCH15_R)
        with Locations((20, 40)):
            Circle(SKETCH15_R)
    extrude(amount=-CUT_EXTRUDE9_DEPTH, mode=Mode.SUBTRACT)

    # Cut-Extrude10: up to this plane
    cut_extrude10_end = Plane(origin=(18.123010882, 55, 5), z_dir=(0.5735764363510469, 0, -0.8191520442889914))
    # Sketch17 → Cut-Extrude10 (cut, up to the surface)
    with BuildSketch(Plane(origin=(30, 0, -17.320508076), x_dir=(-0.5000000000000047, 0, -0.866025403784436), z_dir=(0.866025403784436, 0, -0.5000000000000047)), mode=Mode.PRIVATE) as cut_extrude10_sk1:
        with Locations((-34.202339372, 47.5)):
            Circle(SKETCH17_R)
    cut_extrude10_tool1 = split(extrude(cut_extrude10_sk1.sketch, amount=-CUT_EXTRUDE10_REACH, mode=Mode.PRIVATE), bisect_by=cut_extrude10_end, keep=Keep.BOTH, mode=Mode.PRIVATE)
    add(cut_extrude10_tool1.solids().sort_by_distance((47.10117, 47.5, 12.299587))[0], mode=Mode.SUBTRACT)
    # Sketch17 → Cut-Extrude10 (cut, up to the surface)
    with BuildSketch(Plane(origin=(30, 0, -17.320508076), x_dir=(-0.5000000000000047, 0, -0.866025403784436), z_dir=(0.866025403784436, 0, -0.5000000000000047)), mode=Mode.PRIVATE) as cut_extrude10_sk2:
        with Locations((-39.202339372, 47.5)):
            Circle(SKETCH17_R_2)
    cut_extrude10_tool2 = split(extrude(cut_extrude10_sk2.sketch, amount=-CUT_EXTRUDE10_REACH, mode=Mode.PRIVATE), bisect_by=cut_extrude10_end, keep=Keep.BOTH, mode=Mode.PRIVATE)
    add(cut_extrude10_tool2.solids().sort_by_distance((49.60117, 47.5, 16.629714))[0], mode=Mode.SUBTRACT)

    # Chamfer1
    chamfer1_edges = [part.edges().sort_by_distance(p)[0] for p in [
        (130.334936491, 0, 161.4646997),
    ]]
    chamfer(chamfer1_edges, length=CHAMFER1_SIZE)

    # Fillet6
    fillet6_edges = [part.edges().sort_by_distance(p)[0] for p in [
        (120.334936491, 0, 144.144191624),
        (130.334936491, 20, 161.4646997),
    ]]
    fillet(fillet6_edges, radius=FILLET6_R)

    # Fillet7
    fillet7_edges = [part.edges().sort_by_distance(p)[0] for p in [
        (130.334936491, 55, 161.4646997),
    ]]
    fillet(fillet7_edges, radius=FILLET7_R)

    # Sketch18 → Boss-Extrude8 (add)
    with BuildSketch(Plane(origin=(0, 4, 0), x_dir=(1, 0, 0), z_dir=(0, 1, 0))):
        with Locations((62.5, -119)):
            Rectangle(SKETCH18_W, SKETCH18_H)
    extrude(amount=BOSS_EXTRUDE8_DEPTH)

    # Sketch19 → Boss-Extrude9 (add)
    with BuildSketch(Plane(origin=(70, 0, 0), x_dir=(0, 0, -1), z_dir=(1, 0, 0))):
        with Locations((-119, 22)):
            Rectangle(SKETCH19_W, SKETCH19_H)
    extrude(amount=BOSS_EXTRUDE9_DEPTH)

    # Fillet9
    fillet9_edges = [part.edges().sort_by_distance(p)[0] for p in [
        (70, 4, 119),
        (70, 19, 119),
    ]]
    fillet(fillet9_edges, radius=FILLET9_R)

    # Fillet10
    fillet10_edges = [part.edges().sort_by_distance(p)[0] for p in [
        (100.044427996, 2, 114),
        (100.044427996, 22, 114),
    ]]
    fillet(fillet10_edges, radius=FILLET10_R)

    # Fillet11
    fillet11_edges = [part.edges().sort_by_distance(p)[0] for p in [
        (5, 25, 122),
    ]]
    fillet(fillet11_edges, radius=FILLET11_R)


solid = part.part
